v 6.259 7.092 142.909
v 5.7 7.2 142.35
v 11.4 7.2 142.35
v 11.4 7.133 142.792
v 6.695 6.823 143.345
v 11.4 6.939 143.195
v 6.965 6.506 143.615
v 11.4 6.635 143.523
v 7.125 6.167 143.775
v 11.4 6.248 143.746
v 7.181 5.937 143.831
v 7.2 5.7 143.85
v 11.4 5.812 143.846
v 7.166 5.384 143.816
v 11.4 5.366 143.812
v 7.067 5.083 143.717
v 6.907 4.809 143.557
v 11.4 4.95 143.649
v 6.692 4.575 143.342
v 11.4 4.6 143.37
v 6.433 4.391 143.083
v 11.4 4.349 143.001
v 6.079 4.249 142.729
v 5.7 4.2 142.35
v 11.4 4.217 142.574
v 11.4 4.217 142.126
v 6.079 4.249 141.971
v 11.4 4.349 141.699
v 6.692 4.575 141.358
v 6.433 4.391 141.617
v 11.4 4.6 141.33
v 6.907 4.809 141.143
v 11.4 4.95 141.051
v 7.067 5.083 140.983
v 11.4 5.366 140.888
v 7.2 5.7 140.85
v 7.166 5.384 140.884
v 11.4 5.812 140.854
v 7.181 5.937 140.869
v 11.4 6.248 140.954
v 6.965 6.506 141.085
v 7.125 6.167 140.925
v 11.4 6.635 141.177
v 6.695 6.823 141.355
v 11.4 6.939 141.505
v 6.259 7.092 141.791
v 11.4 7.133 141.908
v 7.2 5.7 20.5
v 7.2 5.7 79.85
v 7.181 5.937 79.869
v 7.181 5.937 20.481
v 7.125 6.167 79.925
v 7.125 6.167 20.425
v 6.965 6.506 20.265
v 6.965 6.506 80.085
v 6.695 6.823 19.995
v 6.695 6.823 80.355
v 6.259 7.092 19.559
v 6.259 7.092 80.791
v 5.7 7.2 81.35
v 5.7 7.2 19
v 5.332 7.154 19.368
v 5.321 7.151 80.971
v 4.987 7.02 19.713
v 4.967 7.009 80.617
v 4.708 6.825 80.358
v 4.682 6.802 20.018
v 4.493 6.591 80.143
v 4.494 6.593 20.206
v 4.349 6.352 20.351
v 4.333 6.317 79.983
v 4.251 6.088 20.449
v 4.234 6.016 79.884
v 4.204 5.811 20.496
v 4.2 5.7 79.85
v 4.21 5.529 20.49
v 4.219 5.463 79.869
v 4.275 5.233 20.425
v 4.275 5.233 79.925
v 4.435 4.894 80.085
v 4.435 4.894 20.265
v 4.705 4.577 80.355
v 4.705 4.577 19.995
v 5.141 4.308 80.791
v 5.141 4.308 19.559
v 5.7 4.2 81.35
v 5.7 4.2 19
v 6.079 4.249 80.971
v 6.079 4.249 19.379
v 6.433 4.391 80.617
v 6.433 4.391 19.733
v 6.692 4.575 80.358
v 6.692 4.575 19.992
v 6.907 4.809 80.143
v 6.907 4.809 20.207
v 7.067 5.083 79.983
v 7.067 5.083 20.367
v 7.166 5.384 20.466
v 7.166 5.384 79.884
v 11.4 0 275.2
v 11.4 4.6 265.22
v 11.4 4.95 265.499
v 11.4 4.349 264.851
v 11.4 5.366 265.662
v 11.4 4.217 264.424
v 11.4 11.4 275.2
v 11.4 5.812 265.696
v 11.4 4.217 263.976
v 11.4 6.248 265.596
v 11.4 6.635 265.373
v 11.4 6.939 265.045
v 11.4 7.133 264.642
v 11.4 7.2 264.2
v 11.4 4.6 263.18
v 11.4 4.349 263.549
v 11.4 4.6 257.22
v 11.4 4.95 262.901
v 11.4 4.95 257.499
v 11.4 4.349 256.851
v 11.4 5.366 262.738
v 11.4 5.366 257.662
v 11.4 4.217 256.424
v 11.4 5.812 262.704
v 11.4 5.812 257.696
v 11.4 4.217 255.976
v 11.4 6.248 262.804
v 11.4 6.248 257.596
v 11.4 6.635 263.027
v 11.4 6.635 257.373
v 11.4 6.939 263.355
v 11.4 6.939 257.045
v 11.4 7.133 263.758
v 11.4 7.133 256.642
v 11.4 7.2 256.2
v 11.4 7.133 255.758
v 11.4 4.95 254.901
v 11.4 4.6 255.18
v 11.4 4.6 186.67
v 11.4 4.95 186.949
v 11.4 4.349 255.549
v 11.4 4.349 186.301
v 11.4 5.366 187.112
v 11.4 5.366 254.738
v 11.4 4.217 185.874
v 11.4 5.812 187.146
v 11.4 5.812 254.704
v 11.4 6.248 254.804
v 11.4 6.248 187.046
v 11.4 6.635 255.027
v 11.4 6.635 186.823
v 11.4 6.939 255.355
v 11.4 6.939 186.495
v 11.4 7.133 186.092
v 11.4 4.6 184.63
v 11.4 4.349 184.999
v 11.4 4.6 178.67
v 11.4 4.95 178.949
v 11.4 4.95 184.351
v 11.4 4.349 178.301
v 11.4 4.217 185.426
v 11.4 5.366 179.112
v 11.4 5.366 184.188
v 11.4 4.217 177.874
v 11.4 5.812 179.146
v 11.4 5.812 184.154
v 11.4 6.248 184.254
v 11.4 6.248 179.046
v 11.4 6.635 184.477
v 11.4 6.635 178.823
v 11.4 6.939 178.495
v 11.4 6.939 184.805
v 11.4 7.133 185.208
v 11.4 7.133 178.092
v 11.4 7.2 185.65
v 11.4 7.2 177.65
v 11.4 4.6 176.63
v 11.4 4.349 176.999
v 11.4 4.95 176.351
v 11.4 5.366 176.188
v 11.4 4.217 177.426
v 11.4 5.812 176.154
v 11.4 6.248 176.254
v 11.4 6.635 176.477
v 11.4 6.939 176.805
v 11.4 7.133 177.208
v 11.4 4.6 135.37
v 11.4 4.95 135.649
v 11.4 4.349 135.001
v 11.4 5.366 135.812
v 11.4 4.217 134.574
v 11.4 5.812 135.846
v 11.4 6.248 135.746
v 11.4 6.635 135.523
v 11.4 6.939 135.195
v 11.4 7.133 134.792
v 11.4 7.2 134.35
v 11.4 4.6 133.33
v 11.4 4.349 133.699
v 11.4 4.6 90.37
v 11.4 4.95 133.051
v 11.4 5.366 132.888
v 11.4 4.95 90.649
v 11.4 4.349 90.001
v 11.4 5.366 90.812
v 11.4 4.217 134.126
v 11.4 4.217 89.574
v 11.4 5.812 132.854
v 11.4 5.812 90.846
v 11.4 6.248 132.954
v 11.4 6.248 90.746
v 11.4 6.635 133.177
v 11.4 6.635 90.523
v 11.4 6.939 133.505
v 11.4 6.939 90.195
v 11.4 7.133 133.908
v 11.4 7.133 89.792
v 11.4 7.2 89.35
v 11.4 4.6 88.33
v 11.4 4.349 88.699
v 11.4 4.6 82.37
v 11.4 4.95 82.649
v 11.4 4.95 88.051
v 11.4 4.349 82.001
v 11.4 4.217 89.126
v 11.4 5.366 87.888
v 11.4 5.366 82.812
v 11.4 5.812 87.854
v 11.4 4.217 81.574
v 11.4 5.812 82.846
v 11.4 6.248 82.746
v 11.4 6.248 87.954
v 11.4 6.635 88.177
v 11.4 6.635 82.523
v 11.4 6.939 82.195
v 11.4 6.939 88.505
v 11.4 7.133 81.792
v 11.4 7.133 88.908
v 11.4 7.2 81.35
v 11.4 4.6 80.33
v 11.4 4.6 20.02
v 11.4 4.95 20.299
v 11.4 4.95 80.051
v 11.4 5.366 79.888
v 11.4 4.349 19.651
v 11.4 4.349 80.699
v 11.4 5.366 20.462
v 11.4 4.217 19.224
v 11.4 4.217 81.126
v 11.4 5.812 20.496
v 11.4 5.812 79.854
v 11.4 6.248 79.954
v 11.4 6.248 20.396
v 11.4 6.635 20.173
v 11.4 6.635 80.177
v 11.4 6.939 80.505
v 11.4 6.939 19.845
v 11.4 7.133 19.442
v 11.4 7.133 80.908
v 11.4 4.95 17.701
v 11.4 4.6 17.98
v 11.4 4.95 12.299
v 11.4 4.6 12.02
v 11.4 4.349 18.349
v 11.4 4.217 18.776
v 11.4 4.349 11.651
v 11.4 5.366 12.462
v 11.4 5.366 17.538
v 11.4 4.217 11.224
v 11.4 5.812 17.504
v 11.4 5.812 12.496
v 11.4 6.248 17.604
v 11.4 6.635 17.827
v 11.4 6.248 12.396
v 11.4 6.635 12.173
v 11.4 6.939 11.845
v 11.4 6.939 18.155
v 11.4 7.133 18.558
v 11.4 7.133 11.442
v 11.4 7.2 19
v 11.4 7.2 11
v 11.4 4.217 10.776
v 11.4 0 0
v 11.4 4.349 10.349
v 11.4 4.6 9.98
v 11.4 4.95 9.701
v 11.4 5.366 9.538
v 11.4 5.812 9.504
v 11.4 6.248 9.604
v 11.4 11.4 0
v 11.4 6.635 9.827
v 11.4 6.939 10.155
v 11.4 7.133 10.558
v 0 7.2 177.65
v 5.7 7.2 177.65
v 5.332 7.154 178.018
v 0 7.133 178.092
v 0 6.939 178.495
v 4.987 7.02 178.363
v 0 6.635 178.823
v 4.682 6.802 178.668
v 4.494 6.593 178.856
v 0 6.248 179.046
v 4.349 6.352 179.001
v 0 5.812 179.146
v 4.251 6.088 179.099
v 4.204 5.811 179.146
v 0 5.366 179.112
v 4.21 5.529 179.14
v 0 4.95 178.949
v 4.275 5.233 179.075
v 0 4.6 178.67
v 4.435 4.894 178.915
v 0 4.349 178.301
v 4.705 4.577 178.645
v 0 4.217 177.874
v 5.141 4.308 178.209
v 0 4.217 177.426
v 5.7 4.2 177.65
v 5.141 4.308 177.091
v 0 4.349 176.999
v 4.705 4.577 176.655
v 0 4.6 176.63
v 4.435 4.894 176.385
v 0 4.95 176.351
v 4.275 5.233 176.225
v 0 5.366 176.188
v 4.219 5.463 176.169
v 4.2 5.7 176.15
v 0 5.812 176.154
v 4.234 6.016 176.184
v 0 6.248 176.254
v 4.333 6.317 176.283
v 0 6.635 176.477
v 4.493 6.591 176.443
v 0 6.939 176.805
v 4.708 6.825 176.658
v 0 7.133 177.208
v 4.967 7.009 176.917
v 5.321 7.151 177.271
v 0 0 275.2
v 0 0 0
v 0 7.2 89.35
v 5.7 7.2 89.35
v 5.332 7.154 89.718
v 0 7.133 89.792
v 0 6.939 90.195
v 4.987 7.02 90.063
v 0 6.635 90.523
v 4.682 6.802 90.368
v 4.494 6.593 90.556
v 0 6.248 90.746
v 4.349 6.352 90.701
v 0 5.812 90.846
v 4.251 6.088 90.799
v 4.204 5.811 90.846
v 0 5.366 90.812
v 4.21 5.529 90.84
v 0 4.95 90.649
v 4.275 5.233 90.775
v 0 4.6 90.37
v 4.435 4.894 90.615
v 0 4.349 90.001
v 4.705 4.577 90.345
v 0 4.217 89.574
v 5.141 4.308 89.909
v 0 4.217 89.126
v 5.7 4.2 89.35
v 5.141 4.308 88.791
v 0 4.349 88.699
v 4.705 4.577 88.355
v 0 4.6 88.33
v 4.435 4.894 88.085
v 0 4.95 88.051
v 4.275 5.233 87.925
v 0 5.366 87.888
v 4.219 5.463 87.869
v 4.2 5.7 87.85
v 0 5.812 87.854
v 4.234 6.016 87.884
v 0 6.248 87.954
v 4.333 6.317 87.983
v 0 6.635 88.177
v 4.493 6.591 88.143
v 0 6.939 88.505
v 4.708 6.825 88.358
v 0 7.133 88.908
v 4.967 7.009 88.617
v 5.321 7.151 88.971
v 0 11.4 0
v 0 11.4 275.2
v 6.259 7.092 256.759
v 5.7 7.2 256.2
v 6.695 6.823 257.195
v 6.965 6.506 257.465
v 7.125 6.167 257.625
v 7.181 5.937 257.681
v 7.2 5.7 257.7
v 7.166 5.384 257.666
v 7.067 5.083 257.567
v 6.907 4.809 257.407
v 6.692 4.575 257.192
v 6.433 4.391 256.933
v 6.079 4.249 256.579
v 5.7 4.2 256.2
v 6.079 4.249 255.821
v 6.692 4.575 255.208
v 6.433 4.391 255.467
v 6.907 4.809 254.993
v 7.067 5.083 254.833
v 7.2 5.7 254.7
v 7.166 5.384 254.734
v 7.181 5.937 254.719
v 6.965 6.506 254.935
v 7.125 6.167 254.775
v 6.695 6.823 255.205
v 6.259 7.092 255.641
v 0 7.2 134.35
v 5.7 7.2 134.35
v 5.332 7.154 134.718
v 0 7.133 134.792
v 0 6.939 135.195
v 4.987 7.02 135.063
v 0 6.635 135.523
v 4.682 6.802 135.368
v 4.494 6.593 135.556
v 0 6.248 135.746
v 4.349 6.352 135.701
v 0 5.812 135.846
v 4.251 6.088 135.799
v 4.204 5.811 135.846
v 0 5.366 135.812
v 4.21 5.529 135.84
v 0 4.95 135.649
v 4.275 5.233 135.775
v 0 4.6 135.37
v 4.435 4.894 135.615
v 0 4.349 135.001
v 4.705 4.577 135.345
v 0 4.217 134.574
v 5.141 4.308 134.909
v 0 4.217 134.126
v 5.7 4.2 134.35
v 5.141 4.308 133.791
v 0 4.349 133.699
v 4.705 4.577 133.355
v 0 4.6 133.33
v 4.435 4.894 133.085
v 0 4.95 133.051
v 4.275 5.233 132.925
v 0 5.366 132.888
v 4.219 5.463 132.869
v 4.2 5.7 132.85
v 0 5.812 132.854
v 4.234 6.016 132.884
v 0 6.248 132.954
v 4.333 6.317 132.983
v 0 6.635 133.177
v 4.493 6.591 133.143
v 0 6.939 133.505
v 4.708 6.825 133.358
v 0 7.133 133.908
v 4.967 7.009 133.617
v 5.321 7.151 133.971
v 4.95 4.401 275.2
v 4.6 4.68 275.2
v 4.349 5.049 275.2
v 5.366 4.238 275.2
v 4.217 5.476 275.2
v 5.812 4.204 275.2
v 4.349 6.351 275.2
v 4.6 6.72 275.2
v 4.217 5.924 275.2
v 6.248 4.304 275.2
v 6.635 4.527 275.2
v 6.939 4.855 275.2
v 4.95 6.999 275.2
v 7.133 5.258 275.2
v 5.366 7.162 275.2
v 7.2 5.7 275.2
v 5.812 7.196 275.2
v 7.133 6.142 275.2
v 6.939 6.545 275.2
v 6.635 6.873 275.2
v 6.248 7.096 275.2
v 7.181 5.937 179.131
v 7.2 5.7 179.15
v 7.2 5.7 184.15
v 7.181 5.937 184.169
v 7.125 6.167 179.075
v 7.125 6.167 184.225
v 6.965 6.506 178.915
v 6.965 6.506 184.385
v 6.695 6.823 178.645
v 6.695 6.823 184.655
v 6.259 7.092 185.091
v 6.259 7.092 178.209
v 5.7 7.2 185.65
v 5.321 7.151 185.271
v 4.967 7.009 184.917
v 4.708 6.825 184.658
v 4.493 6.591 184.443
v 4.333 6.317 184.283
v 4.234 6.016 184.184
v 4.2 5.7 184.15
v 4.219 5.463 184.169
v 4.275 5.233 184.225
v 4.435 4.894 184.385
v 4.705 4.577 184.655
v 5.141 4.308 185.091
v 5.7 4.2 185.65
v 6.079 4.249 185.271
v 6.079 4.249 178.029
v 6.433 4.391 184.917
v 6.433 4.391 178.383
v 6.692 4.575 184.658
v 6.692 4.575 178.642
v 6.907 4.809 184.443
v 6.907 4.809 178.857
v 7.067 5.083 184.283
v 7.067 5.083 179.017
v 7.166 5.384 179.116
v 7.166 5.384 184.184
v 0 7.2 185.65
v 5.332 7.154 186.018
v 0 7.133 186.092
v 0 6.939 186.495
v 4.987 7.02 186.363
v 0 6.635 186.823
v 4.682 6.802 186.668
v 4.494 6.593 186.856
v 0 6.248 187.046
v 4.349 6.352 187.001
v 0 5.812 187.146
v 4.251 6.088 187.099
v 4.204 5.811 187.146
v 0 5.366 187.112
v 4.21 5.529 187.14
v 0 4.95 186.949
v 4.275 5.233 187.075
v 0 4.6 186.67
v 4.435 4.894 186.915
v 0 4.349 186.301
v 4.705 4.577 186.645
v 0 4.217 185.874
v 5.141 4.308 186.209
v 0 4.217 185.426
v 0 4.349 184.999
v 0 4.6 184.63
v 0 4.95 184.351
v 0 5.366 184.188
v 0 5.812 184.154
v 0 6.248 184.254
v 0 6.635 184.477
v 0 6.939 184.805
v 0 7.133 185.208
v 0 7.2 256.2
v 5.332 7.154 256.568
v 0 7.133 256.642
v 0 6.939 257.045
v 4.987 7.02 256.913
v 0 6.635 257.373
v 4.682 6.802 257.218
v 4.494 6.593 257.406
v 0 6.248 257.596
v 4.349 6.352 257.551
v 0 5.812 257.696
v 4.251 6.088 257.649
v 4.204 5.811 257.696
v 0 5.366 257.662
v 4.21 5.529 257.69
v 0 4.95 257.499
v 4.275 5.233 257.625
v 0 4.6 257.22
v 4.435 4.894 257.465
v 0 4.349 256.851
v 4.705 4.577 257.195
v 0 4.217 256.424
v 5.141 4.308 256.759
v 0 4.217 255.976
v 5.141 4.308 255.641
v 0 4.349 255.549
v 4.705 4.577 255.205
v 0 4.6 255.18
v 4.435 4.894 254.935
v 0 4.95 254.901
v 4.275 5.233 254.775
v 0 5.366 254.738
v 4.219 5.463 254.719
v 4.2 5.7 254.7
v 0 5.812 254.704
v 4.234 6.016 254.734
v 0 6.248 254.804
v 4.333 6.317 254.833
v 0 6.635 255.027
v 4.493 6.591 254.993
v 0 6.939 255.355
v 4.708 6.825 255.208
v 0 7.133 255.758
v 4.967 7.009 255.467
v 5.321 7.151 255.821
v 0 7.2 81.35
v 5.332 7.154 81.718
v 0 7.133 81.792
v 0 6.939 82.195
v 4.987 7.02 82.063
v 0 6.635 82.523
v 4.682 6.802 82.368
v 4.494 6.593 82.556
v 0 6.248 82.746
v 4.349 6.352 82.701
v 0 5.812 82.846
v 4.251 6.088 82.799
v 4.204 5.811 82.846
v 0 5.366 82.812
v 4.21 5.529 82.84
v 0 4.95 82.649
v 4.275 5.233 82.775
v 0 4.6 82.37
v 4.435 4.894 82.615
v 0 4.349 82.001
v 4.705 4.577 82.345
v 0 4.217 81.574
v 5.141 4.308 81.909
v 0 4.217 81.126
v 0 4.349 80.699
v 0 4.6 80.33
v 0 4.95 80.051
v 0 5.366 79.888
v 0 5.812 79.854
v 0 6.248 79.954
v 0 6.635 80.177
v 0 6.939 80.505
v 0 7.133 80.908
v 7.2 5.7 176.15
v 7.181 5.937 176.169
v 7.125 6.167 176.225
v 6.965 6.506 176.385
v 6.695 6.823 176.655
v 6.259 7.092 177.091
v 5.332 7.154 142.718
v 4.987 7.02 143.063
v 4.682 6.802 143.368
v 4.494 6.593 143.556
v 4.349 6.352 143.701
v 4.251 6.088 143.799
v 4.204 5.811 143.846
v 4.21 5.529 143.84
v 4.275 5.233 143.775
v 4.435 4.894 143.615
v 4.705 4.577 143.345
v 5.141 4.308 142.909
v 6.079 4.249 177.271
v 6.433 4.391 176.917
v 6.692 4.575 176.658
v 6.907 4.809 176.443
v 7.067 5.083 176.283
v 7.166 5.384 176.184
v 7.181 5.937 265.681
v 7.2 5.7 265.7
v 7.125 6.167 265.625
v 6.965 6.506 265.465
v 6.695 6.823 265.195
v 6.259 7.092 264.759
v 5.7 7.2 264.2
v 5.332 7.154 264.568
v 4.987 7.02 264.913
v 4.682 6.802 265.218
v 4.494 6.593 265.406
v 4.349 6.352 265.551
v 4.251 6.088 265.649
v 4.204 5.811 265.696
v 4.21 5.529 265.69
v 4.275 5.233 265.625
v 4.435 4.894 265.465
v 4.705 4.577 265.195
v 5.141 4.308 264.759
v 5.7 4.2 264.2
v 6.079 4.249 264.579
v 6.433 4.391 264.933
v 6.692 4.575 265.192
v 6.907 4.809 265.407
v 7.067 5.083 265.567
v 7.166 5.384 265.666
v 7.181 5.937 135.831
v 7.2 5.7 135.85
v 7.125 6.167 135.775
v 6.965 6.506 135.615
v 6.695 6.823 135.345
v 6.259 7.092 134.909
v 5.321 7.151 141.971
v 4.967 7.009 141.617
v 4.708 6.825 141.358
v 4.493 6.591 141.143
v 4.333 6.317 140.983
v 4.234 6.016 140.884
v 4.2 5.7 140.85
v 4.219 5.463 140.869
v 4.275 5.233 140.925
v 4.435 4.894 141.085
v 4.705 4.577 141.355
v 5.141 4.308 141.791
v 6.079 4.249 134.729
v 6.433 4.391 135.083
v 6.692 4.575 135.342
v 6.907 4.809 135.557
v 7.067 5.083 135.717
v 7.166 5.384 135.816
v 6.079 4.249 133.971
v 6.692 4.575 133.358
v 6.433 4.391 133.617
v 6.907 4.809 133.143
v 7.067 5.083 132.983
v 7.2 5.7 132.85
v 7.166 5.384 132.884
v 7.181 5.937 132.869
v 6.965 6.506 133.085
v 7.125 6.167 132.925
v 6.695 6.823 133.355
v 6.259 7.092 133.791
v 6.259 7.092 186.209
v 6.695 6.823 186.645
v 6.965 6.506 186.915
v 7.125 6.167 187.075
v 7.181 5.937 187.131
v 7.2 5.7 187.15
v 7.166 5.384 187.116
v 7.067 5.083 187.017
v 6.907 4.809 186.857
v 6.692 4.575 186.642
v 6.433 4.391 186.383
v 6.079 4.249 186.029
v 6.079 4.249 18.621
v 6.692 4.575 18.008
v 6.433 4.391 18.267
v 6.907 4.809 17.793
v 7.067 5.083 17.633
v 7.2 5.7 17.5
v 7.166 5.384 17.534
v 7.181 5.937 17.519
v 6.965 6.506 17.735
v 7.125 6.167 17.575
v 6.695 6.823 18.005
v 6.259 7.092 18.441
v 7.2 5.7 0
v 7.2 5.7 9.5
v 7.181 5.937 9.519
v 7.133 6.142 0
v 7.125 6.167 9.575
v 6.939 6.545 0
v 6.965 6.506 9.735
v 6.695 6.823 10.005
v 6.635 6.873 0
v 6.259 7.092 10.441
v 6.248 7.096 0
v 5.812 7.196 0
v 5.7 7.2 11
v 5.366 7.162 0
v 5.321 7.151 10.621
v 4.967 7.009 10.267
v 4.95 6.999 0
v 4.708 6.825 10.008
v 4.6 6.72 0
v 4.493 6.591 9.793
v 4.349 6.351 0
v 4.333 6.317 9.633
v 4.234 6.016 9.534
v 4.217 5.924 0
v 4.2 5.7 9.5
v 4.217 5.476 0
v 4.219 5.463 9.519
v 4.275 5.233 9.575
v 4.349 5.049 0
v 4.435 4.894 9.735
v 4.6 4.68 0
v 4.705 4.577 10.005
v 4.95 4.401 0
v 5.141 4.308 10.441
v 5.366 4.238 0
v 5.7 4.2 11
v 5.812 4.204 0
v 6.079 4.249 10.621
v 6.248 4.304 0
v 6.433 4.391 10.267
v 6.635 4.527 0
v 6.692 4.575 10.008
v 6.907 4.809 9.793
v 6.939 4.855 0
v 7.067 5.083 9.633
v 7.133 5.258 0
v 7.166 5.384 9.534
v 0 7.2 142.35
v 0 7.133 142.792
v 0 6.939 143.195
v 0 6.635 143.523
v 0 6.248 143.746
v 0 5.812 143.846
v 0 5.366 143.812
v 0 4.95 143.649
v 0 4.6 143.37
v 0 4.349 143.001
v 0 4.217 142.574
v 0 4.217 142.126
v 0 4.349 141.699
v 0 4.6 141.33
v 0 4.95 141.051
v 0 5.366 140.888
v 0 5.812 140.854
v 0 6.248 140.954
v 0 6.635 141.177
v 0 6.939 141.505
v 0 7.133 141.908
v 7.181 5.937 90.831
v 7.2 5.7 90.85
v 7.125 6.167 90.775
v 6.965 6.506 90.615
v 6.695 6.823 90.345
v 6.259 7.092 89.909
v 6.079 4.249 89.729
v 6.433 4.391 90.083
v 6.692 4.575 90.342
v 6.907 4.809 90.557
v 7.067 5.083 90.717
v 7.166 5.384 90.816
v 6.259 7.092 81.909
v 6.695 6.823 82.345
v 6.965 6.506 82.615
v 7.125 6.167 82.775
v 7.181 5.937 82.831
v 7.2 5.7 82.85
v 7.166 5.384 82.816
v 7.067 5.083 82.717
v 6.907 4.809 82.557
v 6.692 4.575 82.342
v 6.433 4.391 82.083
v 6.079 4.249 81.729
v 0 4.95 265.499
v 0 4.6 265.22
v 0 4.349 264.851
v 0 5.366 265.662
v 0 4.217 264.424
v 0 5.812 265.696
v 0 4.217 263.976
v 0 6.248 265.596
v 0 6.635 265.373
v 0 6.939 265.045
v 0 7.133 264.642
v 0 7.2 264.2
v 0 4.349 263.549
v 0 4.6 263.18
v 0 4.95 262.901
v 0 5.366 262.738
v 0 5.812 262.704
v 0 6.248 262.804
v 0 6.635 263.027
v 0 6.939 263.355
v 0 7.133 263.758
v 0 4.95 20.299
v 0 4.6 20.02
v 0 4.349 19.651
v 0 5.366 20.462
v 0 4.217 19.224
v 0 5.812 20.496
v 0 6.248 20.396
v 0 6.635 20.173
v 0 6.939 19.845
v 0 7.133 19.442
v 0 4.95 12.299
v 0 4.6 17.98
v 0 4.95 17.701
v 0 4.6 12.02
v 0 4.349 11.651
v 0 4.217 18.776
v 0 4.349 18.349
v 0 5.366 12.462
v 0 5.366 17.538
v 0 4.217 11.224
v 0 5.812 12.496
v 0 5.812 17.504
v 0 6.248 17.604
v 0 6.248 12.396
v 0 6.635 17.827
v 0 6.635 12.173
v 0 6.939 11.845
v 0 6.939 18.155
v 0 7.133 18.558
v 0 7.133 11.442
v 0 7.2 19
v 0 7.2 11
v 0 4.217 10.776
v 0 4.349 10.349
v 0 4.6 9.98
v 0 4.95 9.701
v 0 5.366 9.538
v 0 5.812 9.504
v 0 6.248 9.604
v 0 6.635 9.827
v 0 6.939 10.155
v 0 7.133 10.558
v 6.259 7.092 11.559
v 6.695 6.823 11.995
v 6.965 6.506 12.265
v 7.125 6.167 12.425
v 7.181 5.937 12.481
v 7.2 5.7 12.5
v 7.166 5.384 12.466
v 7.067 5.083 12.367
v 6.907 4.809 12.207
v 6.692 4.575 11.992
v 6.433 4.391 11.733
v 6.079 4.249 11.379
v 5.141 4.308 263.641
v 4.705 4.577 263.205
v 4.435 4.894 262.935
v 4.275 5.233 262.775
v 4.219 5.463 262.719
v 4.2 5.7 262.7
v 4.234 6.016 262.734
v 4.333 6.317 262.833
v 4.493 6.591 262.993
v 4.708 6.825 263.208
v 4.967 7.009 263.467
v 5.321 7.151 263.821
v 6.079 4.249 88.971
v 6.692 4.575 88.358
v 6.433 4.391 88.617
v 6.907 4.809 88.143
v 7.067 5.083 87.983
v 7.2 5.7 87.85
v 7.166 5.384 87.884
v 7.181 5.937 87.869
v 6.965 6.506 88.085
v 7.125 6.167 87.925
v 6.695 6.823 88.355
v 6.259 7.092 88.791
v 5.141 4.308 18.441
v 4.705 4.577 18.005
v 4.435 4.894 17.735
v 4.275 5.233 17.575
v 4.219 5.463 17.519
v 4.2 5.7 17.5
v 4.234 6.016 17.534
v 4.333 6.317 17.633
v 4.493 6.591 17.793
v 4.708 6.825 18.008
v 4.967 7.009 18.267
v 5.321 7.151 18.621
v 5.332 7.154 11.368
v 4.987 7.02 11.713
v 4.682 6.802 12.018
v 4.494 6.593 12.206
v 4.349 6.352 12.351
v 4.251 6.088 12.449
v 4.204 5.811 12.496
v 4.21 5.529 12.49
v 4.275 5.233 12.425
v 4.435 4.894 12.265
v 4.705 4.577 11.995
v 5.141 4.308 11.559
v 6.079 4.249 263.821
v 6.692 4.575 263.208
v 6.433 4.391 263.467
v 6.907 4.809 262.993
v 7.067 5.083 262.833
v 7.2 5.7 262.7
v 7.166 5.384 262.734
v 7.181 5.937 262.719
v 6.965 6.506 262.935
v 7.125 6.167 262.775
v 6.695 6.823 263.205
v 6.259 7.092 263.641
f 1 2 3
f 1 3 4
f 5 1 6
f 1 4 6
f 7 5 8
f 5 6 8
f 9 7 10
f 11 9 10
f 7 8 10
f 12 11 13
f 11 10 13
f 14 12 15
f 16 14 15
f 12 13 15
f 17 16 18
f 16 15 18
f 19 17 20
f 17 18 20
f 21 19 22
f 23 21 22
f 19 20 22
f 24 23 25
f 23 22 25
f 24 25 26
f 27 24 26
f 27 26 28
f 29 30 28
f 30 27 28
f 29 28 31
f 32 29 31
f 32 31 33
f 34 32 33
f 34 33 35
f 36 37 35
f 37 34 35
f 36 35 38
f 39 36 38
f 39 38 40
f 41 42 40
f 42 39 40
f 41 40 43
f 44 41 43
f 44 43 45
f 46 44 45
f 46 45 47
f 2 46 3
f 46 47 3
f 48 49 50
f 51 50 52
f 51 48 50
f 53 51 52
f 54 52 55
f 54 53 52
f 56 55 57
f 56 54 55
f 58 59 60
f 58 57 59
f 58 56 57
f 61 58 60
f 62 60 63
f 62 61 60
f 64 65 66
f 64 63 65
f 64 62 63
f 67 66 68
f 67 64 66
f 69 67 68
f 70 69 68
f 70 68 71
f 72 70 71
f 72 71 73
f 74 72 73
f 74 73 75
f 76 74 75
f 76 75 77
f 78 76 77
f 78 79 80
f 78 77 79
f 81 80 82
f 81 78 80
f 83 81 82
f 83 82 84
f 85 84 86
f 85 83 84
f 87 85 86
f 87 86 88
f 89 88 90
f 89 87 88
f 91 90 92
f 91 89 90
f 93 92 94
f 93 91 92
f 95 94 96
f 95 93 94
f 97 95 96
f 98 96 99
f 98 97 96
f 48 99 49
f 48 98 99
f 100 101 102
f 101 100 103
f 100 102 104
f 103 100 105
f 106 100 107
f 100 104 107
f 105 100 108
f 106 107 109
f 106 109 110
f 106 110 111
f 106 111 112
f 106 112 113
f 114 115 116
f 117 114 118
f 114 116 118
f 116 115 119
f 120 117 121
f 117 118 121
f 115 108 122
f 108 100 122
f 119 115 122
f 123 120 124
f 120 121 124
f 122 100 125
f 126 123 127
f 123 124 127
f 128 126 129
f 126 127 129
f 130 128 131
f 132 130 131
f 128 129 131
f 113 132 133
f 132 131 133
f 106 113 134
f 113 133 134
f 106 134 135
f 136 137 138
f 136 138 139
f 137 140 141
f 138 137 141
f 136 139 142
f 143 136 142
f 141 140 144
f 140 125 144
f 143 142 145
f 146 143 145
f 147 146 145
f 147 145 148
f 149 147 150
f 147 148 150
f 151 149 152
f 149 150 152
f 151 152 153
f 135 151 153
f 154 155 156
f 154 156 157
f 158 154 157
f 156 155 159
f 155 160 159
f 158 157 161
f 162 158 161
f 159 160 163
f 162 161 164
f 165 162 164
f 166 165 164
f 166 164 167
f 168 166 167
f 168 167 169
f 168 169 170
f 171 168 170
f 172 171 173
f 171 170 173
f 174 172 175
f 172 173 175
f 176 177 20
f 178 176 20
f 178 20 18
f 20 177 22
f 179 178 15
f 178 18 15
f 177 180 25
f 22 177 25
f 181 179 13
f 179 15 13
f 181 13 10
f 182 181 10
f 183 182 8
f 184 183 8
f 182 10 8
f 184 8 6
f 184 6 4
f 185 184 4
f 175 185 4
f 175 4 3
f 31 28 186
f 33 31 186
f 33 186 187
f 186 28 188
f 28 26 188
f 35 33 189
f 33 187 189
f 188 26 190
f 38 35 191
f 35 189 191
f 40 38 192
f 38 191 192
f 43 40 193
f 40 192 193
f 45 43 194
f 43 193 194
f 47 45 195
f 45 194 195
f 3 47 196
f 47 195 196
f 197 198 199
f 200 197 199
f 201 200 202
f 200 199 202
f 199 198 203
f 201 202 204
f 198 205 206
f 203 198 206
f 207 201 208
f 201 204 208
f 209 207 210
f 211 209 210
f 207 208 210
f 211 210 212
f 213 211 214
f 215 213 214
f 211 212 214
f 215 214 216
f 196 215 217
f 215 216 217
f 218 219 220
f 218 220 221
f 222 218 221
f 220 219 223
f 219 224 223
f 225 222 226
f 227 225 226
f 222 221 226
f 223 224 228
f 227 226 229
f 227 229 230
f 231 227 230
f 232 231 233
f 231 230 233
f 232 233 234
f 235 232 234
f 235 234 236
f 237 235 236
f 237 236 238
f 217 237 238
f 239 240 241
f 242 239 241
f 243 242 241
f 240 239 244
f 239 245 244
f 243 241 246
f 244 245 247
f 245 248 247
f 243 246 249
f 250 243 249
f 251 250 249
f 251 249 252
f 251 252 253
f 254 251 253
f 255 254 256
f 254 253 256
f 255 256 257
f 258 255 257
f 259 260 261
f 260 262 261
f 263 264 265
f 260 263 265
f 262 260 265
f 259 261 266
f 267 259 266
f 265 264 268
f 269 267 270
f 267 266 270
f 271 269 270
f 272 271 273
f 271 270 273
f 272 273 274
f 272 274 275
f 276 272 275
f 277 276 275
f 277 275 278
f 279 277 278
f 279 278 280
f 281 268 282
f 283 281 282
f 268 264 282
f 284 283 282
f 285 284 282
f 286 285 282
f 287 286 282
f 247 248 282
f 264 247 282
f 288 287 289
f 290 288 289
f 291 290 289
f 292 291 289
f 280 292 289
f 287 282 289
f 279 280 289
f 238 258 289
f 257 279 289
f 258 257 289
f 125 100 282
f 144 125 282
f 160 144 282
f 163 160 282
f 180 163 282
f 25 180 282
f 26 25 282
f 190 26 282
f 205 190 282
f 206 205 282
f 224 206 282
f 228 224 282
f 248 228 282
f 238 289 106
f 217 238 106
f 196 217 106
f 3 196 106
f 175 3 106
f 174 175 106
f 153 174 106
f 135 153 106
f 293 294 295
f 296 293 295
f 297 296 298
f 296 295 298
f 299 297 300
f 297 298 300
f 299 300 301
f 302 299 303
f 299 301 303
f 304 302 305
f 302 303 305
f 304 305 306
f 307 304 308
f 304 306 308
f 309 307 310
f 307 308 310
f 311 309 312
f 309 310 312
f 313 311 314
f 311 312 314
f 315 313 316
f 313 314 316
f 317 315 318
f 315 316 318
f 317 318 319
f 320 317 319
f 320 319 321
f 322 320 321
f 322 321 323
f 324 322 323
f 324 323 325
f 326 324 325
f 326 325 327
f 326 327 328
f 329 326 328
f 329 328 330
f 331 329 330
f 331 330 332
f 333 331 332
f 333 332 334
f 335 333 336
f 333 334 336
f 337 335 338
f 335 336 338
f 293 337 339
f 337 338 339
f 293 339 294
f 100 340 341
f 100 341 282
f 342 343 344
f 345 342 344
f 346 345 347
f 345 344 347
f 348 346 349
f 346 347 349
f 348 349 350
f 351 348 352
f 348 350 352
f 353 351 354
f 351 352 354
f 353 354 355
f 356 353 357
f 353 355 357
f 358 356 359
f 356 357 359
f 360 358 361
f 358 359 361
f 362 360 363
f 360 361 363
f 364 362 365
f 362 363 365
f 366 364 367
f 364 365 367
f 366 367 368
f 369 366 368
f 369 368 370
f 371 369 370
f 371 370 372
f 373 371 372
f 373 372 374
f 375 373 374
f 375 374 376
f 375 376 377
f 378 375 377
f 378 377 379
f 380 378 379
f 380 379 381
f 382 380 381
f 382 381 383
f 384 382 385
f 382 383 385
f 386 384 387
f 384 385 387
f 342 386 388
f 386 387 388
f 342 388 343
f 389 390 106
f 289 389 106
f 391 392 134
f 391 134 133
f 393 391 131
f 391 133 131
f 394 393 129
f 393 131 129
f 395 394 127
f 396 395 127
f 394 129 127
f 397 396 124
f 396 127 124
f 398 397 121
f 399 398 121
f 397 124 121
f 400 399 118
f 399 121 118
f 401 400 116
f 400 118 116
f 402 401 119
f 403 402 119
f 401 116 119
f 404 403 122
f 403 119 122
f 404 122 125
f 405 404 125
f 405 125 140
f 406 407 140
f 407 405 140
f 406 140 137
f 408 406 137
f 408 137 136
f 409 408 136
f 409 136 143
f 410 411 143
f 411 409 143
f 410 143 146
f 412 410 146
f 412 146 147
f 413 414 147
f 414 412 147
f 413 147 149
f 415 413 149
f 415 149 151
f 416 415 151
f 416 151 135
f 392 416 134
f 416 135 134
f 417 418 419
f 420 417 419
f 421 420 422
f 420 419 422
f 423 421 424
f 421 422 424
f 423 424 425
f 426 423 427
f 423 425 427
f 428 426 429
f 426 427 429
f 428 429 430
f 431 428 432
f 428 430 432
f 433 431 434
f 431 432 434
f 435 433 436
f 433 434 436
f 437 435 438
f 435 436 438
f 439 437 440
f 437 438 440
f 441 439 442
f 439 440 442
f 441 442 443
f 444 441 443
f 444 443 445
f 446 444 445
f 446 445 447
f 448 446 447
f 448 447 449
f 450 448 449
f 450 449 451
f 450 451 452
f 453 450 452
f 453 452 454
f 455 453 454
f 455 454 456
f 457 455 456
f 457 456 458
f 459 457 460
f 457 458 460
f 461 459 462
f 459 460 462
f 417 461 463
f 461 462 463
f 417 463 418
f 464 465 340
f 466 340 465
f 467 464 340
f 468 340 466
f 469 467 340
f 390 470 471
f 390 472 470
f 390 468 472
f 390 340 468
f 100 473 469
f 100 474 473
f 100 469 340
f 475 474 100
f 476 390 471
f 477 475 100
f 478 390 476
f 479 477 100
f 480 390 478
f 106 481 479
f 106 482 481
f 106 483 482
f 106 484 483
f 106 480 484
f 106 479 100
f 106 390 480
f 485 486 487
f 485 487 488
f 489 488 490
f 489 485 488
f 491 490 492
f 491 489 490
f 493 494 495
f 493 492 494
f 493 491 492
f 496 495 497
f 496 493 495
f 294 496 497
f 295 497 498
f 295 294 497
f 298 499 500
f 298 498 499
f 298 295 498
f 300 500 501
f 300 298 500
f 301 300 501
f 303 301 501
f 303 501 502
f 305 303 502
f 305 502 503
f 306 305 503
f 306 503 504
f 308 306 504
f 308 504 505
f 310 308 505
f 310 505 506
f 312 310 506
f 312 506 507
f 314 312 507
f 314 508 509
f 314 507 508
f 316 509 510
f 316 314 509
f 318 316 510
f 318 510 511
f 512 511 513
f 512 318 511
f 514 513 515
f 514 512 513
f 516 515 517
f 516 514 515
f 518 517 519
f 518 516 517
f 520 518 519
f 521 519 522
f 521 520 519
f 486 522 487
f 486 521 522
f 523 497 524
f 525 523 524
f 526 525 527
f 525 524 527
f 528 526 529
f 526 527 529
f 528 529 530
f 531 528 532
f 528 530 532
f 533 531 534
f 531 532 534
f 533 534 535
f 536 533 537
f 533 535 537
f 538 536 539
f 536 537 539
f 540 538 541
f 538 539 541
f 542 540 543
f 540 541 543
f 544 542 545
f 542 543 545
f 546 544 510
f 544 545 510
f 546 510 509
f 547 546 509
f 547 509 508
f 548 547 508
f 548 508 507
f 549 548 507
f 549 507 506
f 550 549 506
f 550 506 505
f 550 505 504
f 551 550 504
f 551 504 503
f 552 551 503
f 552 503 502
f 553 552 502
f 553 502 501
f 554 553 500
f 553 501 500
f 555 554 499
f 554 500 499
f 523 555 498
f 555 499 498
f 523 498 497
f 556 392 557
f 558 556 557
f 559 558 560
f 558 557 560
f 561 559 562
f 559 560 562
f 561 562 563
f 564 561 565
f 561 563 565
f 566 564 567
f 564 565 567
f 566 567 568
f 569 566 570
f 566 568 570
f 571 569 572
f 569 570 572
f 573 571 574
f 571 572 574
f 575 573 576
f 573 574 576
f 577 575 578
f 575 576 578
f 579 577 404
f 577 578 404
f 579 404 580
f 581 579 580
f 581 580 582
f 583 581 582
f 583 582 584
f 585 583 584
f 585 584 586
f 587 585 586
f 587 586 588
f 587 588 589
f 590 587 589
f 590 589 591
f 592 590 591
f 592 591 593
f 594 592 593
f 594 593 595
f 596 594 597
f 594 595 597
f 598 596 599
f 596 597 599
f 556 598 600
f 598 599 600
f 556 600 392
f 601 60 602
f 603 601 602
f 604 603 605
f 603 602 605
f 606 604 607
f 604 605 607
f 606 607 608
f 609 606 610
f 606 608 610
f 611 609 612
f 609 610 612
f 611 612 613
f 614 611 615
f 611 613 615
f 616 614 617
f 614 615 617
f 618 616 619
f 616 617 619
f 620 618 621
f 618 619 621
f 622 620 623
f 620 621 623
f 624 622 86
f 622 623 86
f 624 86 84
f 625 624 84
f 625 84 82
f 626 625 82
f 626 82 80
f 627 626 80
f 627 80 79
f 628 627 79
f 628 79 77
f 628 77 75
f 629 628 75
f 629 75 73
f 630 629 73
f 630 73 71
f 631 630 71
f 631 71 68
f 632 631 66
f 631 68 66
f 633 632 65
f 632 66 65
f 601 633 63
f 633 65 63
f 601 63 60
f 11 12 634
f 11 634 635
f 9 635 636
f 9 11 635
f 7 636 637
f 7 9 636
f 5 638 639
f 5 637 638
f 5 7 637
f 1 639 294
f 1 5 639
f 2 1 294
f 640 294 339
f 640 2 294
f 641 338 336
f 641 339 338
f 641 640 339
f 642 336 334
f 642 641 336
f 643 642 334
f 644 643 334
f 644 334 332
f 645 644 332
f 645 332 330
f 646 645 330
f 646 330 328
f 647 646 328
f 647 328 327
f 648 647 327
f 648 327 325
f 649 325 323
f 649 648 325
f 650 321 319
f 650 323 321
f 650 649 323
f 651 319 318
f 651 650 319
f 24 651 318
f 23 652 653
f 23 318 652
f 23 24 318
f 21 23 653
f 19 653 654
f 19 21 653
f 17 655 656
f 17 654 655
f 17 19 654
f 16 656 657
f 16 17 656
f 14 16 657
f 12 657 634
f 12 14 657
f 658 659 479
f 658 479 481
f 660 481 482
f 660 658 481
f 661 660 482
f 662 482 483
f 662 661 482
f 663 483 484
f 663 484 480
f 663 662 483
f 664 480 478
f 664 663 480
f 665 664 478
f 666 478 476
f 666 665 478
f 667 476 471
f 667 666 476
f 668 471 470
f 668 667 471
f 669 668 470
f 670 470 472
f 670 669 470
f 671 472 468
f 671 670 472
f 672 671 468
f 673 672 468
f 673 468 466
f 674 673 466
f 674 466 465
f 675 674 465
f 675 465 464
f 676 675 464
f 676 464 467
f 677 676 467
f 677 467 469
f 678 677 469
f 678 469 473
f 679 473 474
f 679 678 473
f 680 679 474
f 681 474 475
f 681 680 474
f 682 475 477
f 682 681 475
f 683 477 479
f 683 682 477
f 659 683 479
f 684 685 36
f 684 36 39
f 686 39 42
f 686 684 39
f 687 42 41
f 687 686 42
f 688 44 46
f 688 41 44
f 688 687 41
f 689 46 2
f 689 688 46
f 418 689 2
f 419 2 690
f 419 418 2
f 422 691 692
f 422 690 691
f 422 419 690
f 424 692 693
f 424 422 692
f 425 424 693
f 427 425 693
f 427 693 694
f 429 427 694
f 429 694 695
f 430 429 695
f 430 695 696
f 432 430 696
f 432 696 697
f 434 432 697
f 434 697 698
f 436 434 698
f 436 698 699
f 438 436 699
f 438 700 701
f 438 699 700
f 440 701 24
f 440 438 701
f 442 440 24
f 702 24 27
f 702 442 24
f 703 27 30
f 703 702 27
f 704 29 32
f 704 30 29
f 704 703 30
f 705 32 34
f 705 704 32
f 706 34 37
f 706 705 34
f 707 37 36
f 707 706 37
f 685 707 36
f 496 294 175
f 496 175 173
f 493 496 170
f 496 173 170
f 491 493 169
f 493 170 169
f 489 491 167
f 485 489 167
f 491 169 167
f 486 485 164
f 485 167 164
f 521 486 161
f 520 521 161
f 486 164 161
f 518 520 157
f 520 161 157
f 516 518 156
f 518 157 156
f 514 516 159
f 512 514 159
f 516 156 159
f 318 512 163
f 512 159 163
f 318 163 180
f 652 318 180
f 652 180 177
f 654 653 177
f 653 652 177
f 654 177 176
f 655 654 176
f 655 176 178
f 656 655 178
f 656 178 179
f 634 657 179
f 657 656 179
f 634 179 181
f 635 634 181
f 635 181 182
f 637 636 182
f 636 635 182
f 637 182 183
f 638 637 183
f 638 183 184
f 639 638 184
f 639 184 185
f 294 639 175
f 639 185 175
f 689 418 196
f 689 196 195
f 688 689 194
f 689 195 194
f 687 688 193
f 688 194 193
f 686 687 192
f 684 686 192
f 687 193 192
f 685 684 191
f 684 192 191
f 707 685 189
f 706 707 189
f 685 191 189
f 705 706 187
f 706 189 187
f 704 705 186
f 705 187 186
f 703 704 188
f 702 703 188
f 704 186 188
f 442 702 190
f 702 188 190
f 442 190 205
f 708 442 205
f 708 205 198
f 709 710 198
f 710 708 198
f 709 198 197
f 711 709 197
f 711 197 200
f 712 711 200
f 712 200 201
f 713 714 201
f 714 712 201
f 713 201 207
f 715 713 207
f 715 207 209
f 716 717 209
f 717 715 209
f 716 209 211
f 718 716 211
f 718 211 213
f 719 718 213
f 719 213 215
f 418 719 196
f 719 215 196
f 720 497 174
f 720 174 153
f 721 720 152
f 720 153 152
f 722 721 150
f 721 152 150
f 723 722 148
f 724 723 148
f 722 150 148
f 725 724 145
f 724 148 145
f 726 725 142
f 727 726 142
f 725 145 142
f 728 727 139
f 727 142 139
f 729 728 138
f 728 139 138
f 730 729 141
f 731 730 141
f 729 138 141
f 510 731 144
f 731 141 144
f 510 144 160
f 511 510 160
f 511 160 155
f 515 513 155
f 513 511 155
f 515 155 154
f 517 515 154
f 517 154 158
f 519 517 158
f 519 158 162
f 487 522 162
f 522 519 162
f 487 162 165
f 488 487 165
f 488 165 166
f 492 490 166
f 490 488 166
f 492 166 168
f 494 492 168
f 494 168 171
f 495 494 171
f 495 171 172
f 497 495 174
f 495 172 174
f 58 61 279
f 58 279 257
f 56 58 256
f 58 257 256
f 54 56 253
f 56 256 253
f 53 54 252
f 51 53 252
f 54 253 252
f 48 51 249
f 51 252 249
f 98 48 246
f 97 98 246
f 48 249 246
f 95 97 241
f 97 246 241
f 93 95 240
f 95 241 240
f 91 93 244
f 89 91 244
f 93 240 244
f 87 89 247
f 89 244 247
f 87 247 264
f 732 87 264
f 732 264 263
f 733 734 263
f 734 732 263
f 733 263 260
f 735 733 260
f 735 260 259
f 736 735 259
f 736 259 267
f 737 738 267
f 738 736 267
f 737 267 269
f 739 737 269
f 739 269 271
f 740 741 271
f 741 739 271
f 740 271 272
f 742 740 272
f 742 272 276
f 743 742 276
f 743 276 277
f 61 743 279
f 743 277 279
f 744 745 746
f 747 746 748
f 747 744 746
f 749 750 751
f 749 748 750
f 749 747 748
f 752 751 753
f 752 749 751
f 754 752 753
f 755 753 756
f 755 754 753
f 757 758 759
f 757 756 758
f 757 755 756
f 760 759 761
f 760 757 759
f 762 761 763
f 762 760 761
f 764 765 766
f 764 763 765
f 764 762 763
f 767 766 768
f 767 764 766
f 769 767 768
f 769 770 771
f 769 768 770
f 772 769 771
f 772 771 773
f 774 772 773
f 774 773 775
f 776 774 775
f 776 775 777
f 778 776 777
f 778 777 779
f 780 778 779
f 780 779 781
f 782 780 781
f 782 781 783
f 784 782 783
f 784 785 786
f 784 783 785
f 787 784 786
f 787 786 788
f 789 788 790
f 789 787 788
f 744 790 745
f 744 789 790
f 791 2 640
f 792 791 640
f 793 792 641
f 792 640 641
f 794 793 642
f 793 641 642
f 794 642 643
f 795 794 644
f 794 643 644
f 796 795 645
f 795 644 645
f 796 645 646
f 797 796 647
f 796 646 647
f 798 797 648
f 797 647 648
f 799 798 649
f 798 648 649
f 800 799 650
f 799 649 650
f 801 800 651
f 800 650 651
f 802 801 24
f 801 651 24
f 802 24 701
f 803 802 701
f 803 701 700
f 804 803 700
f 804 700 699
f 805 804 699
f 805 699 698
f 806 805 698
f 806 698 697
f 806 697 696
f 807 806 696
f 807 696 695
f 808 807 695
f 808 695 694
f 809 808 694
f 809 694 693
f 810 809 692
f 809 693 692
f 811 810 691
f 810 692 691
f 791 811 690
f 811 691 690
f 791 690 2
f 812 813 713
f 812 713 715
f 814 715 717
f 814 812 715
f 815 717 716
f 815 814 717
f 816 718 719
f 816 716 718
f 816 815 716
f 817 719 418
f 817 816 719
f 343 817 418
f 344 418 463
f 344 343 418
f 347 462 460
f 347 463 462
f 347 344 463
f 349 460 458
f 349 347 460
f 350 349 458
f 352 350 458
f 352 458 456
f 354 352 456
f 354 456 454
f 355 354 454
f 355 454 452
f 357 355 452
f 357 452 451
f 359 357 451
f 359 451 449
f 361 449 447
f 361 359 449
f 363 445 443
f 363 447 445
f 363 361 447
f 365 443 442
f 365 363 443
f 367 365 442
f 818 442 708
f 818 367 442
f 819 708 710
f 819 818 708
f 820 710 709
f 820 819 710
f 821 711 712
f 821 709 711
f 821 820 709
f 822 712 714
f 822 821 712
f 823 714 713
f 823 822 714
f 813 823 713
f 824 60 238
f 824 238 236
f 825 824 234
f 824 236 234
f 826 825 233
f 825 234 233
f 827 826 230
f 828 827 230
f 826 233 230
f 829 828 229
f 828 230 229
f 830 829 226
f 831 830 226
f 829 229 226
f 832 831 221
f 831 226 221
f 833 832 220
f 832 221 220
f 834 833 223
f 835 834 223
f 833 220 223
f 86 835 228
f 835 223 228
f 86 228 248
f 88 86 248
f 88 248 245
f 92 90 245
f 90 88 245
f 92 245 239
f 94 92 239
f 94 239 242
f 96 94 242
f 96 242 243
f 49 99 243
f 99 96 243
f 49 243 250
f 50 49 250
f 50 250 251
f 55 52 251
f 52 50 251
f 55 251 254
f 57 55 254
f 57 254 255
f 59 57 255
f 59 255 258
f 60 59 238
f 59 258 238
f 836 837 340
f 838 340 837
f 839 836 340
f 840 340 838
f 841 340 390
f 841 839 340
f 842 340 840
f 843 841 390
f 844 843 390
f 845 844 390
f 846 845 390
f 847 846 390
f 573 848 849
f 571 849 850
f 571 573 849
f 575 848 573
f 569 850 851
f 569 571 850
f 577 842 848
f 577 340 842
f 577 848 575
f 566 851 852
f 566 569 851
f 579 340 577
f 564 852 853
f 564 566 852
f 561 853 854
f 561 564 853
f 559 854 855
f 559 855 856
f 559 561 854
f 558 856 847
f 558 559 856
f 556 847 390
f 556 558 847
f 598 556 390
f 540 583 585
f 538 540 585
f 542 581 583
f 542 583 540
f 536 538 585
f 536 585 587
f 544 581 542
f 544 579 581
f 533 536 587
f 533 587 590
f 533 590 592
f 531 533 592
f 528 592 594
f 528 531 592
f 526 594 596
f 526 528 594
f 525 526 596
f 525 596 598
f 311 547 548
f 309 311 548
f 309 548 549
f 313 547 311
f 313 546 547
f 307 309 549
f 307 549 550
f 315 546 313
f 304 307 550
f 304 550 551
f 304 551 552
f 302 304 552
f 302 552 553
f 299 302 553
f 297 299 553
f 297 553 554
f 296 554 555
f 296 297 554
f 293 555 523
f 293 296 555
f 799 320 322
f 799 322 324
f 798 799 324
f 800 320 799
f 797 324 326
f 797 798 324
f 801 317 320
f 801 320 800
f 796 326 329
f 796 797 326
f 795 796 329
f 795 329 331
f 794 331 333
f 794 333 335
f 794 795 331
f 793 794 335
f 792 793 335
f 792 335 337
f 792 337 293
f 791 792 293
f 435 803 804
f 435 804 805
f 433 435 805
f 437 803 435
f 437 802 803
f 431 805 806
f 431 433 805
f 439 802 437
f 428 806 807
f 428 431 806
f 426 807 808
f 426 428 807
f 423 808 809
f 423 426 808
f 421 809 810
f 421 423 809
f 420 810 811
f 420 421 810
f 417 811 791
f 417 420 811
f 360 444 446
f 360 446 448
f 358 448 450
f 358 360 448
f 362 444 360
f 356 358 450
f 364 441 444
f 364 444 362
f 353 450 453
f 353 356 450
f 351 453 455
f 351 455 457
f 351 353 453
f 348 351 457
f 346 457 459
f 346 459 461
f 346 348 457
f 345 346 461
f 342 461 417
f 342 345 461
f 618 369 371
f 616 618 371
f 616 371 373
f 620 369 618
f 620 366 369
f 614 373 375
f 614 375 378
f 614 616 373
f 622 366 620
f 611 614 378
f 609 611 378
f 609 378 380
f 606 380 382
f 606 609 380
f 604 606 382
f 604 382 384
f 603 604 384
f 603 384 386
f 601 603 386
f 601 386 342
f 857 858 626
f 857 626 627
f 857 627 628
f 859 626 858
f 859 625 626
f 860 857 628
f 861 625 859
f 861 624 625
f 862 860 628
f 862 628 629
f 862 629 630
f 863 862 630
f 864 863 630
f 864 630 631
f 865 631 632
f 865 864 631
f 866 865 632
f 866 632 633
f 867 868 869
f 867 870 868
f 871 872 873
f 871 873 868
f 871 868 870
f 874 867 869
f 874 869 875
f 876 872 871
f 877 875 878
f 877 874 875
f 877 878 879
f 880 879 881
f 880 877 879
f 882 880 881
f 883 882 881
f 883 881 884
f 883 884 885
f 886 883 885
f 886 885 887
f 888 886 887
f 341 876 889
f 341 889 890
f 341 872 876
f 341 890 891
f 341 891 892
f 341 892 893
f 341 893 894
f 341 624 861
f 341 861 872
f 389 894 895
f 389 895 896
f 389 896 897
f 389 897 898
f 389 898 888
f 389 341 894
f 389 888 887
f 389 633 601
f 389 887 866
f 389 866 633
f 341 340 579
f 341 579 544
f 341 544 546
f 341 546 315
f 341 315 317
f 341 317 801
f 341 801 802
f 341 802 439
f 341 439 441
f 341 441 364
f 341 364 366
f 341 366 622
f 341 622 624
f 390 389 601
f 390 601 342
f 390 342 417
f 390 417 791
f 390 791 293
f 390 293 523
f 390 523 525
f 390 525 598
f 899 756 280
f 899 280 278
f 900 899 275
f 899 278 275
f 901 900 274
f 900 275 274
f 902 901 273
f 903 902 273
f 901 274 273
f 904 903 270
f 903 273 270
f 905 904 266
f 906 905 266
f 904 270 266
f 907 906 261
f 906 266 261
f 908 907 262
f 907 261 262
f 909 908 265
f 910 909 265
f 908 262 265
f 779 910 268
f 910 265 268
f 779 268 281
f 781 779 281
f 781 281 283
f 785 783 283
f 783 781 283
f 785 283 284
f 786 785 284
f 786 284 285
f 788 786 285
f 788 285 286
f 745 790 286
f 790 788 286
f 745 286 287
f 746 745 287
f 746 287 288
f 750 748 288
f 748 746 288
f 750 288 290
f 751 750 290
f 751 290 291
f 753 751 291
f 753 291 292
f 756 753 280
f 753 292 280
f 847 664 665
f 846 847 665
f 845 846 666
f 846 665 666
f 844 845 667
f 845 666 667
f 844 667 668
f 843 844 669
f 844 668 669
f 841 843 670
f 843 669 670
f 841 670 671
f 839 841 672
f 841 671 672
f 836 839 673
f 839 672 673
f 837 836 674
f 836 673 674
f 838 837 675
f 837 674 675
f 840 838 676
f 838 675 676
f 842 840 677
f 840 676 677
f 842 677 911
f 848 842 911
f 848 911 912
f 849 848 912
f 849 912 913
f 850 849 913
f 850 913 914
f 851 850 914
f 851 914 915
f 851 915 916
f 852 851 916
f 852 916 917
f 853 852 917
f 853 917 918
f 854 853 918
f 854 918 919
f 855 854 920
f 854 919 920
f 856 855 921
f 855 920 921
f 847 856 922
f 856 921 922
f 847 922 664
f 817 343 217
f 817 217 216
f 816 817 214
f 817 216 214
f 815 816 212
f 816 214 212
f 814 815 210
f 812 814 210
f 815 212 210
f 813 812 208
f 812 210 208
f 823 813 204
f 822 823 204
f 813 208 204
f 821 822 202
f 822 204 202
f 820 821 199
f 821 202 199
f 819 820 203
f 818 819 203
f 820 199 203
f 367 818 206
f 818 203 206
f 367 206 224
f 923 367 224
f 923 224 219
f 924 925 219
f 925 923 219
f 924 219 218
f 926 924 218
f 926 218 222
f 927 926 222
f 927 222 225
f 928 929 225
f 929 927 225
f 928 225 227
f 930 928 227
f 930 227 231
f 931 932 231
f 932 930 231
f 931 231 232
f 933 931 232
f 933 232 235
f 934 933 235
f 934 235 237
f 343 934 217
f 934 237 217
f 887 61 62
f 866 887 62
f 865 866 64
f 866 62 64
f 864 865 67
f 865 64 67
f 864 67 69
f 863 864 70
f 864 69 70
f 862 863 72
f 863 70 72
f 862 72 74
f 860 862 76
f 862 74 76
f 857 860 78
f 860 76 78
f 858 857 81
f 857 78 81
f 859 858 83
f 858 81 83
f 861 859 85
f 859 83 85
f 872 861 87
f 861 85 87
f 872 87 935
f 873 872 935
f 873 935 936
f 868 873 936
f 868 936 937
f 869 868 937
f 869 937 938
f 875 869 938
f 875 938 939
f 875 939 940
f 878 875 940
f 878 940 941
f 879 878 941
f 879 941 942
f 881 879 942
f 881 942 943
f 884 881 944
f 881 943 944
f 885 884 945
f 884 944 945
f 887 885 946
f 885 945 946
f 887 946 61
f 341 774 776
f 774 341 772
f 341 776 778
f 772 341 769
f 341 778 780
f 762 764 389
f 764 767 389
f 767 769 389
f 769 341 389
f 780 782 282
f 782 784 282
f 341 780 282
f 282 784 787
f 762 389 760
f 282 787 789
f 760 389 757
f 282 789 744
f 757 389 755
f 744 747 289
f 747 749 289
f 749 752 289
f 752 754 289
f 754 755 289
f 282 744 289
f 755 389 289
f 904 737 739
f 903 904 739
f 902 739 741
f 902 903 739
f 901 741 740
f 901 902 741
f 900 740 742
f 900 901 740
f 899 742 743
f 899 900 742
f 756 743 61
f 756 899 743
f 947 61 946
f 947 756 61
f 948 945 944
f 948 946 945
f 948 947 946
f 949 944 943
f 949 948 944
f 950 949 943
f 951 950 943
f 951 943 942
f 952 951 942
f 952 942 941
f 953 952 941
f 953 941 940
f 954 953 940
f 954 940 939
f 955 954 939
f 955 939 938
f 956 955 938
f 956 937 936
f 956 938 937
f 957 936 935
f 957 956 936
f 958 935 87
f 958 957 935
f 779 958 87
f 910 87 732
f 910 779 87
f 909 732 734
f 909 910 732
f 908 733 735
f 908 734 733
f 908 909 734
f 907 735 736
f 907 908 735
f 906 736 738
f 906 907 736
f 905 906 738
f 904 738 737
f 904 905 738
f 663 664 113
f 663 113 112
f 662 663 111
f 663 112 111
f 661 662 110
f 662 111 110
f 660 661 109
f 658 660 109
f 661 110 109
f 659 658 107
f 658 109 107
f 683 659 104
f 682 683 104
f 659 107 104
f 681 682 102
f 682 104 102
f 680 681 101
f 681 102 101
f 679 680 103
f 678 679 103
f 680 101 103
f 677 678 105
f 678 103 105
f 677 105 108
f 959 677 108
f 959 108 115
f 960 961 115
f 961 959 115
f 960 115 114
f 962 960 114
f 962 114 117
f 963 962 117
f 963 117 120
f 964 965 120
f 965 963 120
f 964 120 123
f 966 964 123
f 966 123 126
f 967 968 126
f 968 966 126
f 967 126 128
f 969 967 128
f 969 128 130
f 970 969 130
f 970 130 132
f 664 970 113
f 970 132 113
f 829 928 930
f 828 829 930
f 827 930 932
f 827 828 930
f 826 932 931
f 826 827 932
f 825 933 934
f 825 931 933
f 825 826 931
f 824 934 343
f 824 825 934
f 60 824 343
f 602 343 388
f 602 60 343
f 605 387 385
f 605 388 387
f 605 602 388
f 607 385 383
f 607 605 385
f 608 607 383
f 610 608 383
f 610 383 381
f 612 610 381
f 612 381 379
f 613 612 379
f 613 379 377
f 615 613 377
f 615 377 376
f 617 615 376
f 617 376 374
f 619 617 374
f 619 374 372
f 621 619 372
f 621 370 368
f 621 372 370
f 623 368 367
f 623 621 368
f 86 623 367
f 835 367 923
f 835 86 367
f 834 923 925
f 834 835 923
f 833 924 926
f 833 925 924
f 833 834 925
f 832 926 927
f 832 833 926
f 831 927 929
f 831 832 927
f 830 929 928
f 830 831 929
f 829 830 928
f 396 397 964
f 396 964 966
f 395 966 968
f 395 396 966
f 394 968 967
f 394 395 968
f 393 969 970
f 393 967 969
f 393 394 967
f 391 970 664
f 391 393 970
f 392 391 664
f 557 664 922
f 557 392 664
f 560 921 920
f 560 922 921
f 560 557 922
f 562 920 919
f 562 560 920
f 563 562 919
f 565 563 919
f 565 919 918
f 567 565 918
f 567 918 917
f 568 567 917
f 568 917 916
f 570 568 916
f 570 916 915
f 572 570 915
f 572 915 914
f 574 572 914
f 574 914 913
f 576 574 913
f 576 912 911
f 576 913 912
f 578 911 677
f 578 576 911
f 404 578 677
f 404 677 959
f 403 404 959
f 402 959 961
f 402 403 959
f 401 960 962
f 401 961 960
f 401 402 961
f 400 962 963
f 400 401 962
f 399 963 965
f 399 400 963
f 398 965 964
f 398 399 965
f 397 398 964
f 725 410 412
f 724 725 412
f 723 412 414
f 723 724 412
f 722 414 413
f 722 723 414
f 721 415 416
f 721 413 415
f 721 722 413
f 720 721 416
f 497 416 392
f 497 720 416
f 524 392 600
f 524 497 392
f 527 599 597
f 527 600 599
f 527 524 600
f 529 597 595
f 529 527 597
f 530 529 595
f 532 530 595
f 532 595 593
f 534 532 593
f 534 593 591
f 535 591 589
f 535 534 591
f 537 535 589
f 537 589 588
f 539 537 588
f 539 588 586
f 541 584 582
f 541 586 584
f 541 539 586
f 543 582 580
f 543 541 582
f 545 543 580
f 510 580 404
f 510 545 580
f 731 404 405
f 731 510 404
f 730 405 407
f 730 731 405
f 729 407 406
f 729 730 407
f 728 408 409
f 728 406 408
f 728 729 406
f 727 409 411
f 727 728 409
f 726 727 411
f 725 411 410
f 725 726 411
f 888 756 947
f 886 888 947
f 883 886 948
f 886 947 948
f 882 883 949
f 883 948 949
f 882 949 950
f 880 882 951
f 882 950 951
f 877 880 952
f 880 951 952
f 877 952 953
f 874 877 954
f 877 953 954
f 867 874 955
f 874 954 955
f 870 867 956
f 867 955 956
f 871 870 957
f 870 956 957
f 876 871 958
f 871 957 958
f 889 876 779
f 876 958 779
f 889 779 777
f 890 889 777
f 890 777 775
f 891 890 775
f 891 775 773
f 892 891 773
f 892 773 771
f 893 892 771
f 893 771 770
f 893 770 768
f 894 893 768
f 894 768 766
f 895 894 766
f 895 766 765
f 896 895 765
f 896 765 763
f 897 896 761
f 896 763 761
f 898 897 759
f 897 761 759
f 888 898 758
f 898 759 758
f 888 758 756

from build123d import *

# Parameters (mm, degrees)
SKETCH_W     = 11.4
SKETCH_H     = 11.4
SKETCH_R     = 1.5
PAD_DEPTH    = 275.2
SKETCH001_R  = 1.5
POCKET_DEPTH = 11.401


with BuildPart() as part:
    # Sketch → Pad (new body)
    with BuildSketch(Plane.XY):
        with Locations((5.7, 5.7)):
            Rectangle(SKETCH_W, SKETCH_H)
        with Locations((5.7, 5.7)):
            Circle(SKETCH_R, mode=Mode.SUBTRACT)
    extrude(amount=PAD_DEPTH)

    # Sketch001 → Pocket (cut, through all)
    with BuildSketch(Plane.YZ.offset(11.4)):
        with Locations((5.7, 142.35)):
            Circle(SKETCH001_R)
        with Locations((5.7, 134.35)):
            Circle(SKETCH001_R)
        with Locations((5.7, 19)):
            Circle(SKETCH001_R)
        with Locations((5.7, 11)):
            Circle(SKETCH001_R)
        with Locations((5.7, 89.35)):
            Circle(SKETCH001_R)
        with Locations((5.7, 81.35)):
            Circle(SKETCH001_R)
        with Locations((5.7, 185.65)):
            Circle(SKETCH001_R)
        with Locations((5.7, 177.65)):
            Circle(SKETCH001_R)
        with Locations((5.7, 264.2)):
            Circle(SKETCH001_R)
        with Locations((5.7, 256.2)):
            Circle(SKETCH001_R)
    extrude(amount=-POCKET_DEPTH, mode=Mode.SUBTRACT)


solid = part.part
